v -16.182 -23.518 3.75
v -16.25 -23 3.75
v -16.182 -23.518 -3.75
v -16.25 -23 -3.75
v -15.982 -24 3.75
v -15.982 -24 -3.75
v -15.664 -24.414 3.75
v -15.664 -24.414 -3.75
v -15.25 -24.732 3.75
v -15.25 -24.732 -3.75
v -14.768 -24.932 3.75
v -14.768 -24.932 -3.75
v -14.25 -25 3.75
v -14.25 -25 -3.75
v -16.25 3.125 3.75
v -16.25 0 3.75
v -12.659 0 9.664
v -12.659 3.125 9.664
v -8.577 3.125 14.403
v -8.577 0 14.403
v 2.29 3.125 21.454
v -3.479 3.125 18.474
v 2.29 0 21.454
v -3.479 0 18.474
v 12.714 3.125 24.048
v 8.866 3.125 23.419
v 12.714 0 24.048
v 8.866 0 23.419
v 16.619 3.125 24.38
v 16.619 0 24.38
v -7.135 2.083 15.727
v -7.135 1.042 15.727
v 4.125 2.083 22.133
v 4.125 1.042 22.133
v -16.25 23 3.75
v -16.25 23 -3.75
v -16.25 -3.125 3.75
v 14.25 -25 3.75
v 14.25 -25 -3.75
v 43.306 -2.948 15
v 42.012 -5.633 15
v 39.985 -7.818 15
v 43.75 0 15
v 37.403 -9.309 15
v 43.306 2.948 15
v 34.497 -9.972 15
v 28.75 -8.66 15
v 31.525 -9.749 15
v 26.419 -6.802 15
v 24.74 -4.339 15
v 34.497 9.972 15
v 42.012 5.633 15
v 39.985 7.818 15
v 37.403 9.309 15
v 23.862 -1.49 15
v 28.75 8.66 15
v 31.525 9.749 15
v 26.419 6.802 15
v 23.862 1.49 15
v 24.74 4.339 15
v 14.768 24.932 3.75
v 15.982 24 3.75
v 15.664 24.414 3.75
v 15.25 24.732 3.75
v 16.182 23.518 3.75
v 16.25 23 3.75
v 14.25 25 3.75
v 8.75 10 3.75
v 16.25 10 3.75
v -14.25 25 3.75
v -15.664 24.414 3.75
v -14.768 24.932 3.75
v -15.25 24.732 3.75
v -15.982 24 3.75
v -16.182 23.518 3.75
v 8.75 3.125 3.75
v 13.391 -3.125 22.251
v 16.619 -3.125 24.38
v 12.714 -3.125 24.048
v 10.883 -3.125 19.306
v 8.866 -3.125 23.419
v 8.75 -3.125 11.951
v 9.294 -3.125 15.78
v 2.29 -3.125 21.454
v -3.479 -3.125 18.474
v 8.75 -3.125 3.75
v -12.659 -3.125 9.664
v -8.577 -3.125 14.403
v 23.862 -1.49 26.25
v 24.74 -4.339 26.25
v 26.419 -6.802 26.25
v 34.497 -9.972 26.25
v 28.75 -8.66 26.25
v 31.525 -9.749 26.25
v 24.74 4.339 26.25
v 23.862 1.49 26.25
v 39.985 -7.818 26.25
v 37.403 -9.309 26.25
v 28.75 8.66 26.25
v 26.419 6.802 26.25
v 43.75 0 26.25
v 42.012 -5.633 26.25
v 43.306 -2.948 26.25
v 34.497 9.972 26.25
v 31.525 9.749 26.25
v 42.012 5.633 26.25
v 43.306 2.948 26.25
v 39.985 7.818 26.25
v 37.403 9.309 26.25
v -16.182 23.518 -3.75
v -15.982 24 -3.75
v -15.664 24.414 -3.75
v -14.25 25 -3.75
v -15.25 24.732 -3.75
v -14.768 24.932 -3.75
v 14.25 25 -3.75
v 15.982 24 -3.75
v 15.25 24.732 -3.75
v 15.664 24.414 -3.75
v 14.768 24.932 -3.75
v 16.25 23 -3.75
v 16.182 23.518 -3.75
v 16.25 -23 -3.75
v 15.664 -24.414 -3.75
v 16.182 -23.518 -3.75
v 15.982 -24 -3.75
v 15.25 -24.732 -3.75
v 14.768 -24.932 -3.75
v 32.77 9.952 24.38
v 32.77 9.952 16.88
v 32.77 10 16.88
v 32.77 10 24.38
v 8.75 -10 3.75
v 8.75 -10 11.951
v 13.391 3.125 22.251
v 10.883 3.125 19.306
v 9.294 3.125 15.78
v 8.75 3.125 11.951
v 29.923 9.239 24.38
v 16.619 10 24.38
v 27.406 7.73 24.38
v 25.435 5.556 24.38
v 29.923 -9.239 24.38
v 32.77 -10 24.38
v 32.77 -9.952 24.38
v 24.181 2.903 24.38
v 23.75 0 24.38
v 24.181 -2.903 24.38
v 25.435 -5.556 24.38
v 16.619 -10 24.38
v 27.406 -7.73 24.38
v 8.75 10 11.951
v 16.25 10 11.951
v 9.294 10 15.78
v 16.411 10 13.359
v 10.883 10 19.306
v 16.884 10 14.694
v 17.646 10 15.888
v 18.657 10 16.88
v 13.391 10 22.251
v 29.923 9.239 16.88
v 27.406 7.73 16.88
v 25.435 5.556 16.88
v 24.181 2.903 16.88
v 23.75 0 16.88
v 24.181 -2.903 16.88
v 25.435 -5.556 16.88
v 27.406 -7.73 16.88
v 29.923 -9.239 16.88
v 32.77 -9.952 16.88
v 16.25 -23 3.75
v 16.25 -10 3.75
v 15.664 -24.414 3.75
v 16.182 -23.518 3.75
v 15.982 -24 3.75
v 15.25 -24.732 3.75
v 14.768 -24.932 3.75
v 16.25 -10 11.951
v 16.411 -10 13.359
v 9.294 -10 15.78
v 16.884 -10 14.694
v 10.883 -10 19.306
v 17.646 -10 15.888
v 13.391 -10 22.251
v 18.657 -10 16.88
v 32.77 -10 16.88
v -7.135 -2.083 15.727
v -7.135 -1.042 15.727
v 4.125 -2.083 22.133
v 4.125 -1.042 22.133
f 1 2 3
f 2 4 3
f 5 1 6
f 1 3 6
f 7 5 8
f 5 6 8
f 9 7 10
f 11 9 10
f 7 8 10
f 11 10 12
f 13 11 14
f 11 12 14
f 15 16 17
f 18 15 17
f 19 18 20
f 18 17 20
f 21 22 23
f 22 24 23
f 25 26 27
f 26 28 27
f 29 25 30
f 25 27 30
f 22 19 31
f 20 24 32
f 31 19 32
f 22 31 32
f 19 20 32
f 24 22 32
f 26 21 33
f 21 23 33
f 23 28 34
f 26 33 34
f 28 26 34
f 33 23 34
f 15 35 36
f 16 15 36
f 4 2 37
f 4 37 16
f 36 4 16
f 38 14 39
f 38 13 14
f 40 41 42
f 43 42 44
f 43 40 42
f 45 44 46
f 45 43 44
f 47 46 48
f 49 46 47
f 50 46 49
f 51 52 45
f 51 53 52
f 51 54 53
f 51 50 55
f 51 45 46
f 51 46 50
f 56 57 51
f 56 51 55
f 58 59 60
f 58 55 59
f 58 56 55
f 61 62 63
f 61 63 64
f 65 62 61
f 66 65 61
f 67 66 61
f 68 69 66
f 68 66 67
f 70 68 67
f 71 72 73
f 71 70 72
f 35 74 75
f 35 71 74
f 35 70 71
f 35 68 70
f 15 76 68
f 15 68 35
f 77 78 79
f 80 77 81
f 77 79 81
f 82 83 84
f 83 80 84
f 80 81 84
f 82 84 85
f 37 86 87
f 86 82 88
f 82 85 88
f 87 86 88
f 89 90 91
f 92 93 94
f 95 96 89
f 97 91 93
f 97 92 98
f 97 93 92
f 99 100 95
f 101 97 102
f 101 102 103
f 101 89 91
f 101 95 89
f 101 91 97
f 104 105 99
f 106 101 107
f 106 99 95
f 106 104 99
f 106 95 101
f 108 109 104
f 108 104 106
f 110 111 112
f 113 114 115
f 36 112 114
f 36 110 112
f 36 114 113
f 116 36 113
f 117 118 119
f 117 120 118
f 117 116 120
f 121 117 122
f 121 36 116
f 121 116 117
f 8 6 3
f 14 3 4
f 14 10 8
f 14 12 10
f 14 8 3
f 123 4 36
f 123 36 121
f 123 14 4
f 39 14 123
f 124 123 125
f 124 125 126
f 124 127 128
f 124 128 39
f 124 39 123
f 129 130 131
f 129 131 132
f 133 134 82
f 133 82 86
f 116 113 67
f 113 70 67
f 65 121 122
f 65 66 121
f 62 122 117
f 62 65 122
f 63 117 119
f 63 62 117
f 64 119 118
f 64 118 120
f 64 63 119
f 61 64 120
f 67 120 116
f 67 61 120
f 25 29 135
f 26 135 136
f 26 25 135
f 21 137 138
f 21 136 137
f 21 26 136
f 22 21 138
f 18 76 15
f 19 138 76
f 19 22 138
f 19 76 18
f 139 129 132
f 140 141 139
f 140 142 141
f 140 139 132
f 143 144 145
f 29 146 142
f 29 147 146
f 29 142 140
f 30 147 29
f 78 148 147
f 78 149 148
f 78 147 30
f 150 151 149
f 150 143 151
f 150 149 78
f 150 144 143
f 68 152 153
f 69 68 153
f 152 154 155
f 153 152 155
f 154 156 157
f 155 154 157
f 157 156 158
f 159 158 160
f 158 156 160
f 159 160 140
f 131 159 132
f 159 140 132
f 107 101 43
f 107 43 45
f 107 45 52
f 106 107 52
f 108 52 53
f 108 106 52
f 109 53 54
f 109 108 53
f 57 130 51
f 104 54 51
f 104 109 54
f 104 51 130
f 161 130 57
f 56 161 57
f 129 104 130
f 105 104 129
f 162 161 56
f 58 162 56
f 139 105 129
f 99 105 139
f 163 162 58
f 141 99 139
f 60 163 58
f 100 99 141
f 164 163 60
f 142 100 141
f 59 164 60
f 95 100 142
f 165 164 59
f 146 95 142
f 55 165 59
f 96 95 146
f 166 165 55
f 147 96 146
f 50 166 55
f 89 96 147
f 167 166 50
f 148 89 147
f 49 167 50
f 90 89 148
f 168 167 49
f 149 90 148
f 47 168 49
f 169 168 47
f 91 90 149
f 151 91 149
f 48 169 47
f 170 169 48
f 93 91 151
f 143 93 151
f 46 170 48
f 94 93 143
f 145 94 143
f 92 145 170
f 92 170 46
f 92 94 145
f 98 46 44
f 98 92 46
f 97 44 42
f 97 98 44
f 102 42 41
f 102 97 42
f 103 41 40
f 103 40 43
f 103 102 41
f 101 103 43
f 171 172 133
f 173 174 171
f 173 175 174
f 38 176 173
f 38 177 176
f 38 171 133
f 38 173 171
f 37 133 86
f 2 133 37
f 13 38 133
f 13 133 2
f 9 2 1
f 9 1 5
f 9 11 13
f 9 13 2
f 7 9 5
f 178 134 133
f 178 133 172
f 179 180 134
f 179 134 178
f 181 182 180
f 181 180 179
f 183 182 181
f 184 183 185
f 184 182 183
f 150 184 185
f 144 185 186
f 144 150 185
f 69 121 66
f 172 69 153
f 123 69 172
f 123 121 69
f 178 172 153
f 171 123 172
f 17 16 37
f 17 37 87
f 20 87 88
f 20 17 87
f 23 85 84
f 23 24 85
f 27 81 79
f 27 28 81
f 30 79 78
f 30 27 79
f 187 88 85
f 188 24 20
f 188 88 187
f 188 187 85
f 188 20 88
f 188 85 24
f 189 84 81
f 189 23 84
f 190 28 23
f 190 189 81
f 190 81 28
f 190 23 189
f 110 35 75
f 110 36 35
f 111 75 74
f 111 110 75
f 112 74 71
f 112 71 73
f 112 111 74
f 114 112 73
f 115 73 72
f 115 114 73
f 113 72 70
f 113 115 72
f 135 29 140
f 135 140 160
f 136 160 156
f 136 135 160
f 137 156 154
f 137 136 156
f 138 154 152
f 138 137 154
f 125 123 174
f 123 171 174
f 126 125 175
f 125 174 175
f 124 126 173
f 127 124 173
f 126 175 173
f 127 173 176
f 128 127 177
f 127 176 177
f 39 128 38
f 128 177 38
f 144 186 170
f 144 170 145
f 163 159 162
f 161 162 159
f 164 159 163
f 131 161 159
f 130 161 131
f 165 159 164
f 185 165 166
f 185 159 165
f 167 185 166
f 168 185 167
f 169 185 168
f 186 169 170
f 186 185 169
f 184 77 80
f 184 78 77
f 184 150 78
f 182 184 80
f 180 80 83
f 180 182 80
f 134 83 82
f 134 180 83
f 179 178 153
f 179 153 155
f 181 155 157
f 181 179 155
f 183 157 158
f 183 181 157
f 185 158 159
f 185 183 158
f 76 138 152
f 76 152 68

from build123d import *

# Parameters (mm, degrees)
F1_DEPTH = 25
F0_W     = 9.020209058
F0_H     = 7.5
F2_DEPTH = 10
F3_DEPTH = 3.125
F5_R     = 2


with BuildPart() as f1:
    # F0 (on Front) → F1 (new body, symmetric)
    with BuildSketch(Plane.XZ):
        Polygon((8.75, 3.75), (-16.25, 3.75), (-16.25, -3.75), (16.25, -3.75), (16.25, 3.75), align=None)
    extrude(amount=F1_DEPTH, both=True)

    # F0 (on Front) → F2 (join, symmetric)
    with BuildSketch(Plane.XZ):
        with BuildLine():
            Line((8.75, 11.9511034528), (8.75, 3.75))
            Line((8.75, 3.75), (16.25, 3.75))
            Line((16.25, 3.75), (16.25, 11.9511034528))
            ThreePointArc((16.25, 11.9511034528), (16.8839020833, 14.6937197566), (18.6570221407, 16.88))
            Line((18.6570221407, 16.88), (23.75, 16.88))
            Line((23.75, 16.88), (23.75, 24.38))
            Line((23.75, 24.38), (16.6190961053, 24.38))
            ThreePointArc((16.6190961053, 24.38), (10.8826653541, 19.3063761006), (8.75, 11.9511034528))
        make_face()
        with Locations((28.260104529, 20.63)):
            Rectangle(F0_W, F0_H)
    extrude(amount=F2_DEPTH, both=True)

    # F0 (on Front) → F3 (join, symmetric)
    with BuildSketch(Plane.XZ):
        with BuildLine():
            add(Edge.make_bspline(
                [(-16.25, 3.75), (-8.5098091513, 18.9848486334), (3.8099950824, 23.7404676708), (16.6190961053, 24.38)],
                knots=[0, 0, 0, 0, 38.8068857135, 38.8068857135, 38.8068857135, 38.8068857135], degree=3))
            Line((-16.25, 3.75), (8.75, 3.75))
            Line((8.75, 3.75), (8.75, 11.9511034528))
            ThreePointArc((8.75, 11.9511034528), (10.8826653541, 19.3063761006), (16.6190961053, 24.38))
        make_face()
    extrude(amount=F3_DEPTH, both=True)

    # F0 (on Front) → F4 (revolve)
    with BuildSketch(Plane.XZ):
        Polygon((43.75, 26.25), (33.75, 26.25), (33.75, 24.38), (33.75, 20.625), (33.75, 16.88), (33.75, 15), (43.75, 15), align=None)
    revolve(axis=Axis((33.75, 0, 23.4375), (0, 0, 1)))

    # F5
    f5_edges = [f1.edges().sort_by_distance(p)[0] for p in [
        (-16.25, 25, 0),
        (-16.25, -25, 0),
        (16.25, -25, 0),
        (16.25, 25, 0),
    ]]
    fillet(f5_edges, radius=F5_R)


solid = f1.part
